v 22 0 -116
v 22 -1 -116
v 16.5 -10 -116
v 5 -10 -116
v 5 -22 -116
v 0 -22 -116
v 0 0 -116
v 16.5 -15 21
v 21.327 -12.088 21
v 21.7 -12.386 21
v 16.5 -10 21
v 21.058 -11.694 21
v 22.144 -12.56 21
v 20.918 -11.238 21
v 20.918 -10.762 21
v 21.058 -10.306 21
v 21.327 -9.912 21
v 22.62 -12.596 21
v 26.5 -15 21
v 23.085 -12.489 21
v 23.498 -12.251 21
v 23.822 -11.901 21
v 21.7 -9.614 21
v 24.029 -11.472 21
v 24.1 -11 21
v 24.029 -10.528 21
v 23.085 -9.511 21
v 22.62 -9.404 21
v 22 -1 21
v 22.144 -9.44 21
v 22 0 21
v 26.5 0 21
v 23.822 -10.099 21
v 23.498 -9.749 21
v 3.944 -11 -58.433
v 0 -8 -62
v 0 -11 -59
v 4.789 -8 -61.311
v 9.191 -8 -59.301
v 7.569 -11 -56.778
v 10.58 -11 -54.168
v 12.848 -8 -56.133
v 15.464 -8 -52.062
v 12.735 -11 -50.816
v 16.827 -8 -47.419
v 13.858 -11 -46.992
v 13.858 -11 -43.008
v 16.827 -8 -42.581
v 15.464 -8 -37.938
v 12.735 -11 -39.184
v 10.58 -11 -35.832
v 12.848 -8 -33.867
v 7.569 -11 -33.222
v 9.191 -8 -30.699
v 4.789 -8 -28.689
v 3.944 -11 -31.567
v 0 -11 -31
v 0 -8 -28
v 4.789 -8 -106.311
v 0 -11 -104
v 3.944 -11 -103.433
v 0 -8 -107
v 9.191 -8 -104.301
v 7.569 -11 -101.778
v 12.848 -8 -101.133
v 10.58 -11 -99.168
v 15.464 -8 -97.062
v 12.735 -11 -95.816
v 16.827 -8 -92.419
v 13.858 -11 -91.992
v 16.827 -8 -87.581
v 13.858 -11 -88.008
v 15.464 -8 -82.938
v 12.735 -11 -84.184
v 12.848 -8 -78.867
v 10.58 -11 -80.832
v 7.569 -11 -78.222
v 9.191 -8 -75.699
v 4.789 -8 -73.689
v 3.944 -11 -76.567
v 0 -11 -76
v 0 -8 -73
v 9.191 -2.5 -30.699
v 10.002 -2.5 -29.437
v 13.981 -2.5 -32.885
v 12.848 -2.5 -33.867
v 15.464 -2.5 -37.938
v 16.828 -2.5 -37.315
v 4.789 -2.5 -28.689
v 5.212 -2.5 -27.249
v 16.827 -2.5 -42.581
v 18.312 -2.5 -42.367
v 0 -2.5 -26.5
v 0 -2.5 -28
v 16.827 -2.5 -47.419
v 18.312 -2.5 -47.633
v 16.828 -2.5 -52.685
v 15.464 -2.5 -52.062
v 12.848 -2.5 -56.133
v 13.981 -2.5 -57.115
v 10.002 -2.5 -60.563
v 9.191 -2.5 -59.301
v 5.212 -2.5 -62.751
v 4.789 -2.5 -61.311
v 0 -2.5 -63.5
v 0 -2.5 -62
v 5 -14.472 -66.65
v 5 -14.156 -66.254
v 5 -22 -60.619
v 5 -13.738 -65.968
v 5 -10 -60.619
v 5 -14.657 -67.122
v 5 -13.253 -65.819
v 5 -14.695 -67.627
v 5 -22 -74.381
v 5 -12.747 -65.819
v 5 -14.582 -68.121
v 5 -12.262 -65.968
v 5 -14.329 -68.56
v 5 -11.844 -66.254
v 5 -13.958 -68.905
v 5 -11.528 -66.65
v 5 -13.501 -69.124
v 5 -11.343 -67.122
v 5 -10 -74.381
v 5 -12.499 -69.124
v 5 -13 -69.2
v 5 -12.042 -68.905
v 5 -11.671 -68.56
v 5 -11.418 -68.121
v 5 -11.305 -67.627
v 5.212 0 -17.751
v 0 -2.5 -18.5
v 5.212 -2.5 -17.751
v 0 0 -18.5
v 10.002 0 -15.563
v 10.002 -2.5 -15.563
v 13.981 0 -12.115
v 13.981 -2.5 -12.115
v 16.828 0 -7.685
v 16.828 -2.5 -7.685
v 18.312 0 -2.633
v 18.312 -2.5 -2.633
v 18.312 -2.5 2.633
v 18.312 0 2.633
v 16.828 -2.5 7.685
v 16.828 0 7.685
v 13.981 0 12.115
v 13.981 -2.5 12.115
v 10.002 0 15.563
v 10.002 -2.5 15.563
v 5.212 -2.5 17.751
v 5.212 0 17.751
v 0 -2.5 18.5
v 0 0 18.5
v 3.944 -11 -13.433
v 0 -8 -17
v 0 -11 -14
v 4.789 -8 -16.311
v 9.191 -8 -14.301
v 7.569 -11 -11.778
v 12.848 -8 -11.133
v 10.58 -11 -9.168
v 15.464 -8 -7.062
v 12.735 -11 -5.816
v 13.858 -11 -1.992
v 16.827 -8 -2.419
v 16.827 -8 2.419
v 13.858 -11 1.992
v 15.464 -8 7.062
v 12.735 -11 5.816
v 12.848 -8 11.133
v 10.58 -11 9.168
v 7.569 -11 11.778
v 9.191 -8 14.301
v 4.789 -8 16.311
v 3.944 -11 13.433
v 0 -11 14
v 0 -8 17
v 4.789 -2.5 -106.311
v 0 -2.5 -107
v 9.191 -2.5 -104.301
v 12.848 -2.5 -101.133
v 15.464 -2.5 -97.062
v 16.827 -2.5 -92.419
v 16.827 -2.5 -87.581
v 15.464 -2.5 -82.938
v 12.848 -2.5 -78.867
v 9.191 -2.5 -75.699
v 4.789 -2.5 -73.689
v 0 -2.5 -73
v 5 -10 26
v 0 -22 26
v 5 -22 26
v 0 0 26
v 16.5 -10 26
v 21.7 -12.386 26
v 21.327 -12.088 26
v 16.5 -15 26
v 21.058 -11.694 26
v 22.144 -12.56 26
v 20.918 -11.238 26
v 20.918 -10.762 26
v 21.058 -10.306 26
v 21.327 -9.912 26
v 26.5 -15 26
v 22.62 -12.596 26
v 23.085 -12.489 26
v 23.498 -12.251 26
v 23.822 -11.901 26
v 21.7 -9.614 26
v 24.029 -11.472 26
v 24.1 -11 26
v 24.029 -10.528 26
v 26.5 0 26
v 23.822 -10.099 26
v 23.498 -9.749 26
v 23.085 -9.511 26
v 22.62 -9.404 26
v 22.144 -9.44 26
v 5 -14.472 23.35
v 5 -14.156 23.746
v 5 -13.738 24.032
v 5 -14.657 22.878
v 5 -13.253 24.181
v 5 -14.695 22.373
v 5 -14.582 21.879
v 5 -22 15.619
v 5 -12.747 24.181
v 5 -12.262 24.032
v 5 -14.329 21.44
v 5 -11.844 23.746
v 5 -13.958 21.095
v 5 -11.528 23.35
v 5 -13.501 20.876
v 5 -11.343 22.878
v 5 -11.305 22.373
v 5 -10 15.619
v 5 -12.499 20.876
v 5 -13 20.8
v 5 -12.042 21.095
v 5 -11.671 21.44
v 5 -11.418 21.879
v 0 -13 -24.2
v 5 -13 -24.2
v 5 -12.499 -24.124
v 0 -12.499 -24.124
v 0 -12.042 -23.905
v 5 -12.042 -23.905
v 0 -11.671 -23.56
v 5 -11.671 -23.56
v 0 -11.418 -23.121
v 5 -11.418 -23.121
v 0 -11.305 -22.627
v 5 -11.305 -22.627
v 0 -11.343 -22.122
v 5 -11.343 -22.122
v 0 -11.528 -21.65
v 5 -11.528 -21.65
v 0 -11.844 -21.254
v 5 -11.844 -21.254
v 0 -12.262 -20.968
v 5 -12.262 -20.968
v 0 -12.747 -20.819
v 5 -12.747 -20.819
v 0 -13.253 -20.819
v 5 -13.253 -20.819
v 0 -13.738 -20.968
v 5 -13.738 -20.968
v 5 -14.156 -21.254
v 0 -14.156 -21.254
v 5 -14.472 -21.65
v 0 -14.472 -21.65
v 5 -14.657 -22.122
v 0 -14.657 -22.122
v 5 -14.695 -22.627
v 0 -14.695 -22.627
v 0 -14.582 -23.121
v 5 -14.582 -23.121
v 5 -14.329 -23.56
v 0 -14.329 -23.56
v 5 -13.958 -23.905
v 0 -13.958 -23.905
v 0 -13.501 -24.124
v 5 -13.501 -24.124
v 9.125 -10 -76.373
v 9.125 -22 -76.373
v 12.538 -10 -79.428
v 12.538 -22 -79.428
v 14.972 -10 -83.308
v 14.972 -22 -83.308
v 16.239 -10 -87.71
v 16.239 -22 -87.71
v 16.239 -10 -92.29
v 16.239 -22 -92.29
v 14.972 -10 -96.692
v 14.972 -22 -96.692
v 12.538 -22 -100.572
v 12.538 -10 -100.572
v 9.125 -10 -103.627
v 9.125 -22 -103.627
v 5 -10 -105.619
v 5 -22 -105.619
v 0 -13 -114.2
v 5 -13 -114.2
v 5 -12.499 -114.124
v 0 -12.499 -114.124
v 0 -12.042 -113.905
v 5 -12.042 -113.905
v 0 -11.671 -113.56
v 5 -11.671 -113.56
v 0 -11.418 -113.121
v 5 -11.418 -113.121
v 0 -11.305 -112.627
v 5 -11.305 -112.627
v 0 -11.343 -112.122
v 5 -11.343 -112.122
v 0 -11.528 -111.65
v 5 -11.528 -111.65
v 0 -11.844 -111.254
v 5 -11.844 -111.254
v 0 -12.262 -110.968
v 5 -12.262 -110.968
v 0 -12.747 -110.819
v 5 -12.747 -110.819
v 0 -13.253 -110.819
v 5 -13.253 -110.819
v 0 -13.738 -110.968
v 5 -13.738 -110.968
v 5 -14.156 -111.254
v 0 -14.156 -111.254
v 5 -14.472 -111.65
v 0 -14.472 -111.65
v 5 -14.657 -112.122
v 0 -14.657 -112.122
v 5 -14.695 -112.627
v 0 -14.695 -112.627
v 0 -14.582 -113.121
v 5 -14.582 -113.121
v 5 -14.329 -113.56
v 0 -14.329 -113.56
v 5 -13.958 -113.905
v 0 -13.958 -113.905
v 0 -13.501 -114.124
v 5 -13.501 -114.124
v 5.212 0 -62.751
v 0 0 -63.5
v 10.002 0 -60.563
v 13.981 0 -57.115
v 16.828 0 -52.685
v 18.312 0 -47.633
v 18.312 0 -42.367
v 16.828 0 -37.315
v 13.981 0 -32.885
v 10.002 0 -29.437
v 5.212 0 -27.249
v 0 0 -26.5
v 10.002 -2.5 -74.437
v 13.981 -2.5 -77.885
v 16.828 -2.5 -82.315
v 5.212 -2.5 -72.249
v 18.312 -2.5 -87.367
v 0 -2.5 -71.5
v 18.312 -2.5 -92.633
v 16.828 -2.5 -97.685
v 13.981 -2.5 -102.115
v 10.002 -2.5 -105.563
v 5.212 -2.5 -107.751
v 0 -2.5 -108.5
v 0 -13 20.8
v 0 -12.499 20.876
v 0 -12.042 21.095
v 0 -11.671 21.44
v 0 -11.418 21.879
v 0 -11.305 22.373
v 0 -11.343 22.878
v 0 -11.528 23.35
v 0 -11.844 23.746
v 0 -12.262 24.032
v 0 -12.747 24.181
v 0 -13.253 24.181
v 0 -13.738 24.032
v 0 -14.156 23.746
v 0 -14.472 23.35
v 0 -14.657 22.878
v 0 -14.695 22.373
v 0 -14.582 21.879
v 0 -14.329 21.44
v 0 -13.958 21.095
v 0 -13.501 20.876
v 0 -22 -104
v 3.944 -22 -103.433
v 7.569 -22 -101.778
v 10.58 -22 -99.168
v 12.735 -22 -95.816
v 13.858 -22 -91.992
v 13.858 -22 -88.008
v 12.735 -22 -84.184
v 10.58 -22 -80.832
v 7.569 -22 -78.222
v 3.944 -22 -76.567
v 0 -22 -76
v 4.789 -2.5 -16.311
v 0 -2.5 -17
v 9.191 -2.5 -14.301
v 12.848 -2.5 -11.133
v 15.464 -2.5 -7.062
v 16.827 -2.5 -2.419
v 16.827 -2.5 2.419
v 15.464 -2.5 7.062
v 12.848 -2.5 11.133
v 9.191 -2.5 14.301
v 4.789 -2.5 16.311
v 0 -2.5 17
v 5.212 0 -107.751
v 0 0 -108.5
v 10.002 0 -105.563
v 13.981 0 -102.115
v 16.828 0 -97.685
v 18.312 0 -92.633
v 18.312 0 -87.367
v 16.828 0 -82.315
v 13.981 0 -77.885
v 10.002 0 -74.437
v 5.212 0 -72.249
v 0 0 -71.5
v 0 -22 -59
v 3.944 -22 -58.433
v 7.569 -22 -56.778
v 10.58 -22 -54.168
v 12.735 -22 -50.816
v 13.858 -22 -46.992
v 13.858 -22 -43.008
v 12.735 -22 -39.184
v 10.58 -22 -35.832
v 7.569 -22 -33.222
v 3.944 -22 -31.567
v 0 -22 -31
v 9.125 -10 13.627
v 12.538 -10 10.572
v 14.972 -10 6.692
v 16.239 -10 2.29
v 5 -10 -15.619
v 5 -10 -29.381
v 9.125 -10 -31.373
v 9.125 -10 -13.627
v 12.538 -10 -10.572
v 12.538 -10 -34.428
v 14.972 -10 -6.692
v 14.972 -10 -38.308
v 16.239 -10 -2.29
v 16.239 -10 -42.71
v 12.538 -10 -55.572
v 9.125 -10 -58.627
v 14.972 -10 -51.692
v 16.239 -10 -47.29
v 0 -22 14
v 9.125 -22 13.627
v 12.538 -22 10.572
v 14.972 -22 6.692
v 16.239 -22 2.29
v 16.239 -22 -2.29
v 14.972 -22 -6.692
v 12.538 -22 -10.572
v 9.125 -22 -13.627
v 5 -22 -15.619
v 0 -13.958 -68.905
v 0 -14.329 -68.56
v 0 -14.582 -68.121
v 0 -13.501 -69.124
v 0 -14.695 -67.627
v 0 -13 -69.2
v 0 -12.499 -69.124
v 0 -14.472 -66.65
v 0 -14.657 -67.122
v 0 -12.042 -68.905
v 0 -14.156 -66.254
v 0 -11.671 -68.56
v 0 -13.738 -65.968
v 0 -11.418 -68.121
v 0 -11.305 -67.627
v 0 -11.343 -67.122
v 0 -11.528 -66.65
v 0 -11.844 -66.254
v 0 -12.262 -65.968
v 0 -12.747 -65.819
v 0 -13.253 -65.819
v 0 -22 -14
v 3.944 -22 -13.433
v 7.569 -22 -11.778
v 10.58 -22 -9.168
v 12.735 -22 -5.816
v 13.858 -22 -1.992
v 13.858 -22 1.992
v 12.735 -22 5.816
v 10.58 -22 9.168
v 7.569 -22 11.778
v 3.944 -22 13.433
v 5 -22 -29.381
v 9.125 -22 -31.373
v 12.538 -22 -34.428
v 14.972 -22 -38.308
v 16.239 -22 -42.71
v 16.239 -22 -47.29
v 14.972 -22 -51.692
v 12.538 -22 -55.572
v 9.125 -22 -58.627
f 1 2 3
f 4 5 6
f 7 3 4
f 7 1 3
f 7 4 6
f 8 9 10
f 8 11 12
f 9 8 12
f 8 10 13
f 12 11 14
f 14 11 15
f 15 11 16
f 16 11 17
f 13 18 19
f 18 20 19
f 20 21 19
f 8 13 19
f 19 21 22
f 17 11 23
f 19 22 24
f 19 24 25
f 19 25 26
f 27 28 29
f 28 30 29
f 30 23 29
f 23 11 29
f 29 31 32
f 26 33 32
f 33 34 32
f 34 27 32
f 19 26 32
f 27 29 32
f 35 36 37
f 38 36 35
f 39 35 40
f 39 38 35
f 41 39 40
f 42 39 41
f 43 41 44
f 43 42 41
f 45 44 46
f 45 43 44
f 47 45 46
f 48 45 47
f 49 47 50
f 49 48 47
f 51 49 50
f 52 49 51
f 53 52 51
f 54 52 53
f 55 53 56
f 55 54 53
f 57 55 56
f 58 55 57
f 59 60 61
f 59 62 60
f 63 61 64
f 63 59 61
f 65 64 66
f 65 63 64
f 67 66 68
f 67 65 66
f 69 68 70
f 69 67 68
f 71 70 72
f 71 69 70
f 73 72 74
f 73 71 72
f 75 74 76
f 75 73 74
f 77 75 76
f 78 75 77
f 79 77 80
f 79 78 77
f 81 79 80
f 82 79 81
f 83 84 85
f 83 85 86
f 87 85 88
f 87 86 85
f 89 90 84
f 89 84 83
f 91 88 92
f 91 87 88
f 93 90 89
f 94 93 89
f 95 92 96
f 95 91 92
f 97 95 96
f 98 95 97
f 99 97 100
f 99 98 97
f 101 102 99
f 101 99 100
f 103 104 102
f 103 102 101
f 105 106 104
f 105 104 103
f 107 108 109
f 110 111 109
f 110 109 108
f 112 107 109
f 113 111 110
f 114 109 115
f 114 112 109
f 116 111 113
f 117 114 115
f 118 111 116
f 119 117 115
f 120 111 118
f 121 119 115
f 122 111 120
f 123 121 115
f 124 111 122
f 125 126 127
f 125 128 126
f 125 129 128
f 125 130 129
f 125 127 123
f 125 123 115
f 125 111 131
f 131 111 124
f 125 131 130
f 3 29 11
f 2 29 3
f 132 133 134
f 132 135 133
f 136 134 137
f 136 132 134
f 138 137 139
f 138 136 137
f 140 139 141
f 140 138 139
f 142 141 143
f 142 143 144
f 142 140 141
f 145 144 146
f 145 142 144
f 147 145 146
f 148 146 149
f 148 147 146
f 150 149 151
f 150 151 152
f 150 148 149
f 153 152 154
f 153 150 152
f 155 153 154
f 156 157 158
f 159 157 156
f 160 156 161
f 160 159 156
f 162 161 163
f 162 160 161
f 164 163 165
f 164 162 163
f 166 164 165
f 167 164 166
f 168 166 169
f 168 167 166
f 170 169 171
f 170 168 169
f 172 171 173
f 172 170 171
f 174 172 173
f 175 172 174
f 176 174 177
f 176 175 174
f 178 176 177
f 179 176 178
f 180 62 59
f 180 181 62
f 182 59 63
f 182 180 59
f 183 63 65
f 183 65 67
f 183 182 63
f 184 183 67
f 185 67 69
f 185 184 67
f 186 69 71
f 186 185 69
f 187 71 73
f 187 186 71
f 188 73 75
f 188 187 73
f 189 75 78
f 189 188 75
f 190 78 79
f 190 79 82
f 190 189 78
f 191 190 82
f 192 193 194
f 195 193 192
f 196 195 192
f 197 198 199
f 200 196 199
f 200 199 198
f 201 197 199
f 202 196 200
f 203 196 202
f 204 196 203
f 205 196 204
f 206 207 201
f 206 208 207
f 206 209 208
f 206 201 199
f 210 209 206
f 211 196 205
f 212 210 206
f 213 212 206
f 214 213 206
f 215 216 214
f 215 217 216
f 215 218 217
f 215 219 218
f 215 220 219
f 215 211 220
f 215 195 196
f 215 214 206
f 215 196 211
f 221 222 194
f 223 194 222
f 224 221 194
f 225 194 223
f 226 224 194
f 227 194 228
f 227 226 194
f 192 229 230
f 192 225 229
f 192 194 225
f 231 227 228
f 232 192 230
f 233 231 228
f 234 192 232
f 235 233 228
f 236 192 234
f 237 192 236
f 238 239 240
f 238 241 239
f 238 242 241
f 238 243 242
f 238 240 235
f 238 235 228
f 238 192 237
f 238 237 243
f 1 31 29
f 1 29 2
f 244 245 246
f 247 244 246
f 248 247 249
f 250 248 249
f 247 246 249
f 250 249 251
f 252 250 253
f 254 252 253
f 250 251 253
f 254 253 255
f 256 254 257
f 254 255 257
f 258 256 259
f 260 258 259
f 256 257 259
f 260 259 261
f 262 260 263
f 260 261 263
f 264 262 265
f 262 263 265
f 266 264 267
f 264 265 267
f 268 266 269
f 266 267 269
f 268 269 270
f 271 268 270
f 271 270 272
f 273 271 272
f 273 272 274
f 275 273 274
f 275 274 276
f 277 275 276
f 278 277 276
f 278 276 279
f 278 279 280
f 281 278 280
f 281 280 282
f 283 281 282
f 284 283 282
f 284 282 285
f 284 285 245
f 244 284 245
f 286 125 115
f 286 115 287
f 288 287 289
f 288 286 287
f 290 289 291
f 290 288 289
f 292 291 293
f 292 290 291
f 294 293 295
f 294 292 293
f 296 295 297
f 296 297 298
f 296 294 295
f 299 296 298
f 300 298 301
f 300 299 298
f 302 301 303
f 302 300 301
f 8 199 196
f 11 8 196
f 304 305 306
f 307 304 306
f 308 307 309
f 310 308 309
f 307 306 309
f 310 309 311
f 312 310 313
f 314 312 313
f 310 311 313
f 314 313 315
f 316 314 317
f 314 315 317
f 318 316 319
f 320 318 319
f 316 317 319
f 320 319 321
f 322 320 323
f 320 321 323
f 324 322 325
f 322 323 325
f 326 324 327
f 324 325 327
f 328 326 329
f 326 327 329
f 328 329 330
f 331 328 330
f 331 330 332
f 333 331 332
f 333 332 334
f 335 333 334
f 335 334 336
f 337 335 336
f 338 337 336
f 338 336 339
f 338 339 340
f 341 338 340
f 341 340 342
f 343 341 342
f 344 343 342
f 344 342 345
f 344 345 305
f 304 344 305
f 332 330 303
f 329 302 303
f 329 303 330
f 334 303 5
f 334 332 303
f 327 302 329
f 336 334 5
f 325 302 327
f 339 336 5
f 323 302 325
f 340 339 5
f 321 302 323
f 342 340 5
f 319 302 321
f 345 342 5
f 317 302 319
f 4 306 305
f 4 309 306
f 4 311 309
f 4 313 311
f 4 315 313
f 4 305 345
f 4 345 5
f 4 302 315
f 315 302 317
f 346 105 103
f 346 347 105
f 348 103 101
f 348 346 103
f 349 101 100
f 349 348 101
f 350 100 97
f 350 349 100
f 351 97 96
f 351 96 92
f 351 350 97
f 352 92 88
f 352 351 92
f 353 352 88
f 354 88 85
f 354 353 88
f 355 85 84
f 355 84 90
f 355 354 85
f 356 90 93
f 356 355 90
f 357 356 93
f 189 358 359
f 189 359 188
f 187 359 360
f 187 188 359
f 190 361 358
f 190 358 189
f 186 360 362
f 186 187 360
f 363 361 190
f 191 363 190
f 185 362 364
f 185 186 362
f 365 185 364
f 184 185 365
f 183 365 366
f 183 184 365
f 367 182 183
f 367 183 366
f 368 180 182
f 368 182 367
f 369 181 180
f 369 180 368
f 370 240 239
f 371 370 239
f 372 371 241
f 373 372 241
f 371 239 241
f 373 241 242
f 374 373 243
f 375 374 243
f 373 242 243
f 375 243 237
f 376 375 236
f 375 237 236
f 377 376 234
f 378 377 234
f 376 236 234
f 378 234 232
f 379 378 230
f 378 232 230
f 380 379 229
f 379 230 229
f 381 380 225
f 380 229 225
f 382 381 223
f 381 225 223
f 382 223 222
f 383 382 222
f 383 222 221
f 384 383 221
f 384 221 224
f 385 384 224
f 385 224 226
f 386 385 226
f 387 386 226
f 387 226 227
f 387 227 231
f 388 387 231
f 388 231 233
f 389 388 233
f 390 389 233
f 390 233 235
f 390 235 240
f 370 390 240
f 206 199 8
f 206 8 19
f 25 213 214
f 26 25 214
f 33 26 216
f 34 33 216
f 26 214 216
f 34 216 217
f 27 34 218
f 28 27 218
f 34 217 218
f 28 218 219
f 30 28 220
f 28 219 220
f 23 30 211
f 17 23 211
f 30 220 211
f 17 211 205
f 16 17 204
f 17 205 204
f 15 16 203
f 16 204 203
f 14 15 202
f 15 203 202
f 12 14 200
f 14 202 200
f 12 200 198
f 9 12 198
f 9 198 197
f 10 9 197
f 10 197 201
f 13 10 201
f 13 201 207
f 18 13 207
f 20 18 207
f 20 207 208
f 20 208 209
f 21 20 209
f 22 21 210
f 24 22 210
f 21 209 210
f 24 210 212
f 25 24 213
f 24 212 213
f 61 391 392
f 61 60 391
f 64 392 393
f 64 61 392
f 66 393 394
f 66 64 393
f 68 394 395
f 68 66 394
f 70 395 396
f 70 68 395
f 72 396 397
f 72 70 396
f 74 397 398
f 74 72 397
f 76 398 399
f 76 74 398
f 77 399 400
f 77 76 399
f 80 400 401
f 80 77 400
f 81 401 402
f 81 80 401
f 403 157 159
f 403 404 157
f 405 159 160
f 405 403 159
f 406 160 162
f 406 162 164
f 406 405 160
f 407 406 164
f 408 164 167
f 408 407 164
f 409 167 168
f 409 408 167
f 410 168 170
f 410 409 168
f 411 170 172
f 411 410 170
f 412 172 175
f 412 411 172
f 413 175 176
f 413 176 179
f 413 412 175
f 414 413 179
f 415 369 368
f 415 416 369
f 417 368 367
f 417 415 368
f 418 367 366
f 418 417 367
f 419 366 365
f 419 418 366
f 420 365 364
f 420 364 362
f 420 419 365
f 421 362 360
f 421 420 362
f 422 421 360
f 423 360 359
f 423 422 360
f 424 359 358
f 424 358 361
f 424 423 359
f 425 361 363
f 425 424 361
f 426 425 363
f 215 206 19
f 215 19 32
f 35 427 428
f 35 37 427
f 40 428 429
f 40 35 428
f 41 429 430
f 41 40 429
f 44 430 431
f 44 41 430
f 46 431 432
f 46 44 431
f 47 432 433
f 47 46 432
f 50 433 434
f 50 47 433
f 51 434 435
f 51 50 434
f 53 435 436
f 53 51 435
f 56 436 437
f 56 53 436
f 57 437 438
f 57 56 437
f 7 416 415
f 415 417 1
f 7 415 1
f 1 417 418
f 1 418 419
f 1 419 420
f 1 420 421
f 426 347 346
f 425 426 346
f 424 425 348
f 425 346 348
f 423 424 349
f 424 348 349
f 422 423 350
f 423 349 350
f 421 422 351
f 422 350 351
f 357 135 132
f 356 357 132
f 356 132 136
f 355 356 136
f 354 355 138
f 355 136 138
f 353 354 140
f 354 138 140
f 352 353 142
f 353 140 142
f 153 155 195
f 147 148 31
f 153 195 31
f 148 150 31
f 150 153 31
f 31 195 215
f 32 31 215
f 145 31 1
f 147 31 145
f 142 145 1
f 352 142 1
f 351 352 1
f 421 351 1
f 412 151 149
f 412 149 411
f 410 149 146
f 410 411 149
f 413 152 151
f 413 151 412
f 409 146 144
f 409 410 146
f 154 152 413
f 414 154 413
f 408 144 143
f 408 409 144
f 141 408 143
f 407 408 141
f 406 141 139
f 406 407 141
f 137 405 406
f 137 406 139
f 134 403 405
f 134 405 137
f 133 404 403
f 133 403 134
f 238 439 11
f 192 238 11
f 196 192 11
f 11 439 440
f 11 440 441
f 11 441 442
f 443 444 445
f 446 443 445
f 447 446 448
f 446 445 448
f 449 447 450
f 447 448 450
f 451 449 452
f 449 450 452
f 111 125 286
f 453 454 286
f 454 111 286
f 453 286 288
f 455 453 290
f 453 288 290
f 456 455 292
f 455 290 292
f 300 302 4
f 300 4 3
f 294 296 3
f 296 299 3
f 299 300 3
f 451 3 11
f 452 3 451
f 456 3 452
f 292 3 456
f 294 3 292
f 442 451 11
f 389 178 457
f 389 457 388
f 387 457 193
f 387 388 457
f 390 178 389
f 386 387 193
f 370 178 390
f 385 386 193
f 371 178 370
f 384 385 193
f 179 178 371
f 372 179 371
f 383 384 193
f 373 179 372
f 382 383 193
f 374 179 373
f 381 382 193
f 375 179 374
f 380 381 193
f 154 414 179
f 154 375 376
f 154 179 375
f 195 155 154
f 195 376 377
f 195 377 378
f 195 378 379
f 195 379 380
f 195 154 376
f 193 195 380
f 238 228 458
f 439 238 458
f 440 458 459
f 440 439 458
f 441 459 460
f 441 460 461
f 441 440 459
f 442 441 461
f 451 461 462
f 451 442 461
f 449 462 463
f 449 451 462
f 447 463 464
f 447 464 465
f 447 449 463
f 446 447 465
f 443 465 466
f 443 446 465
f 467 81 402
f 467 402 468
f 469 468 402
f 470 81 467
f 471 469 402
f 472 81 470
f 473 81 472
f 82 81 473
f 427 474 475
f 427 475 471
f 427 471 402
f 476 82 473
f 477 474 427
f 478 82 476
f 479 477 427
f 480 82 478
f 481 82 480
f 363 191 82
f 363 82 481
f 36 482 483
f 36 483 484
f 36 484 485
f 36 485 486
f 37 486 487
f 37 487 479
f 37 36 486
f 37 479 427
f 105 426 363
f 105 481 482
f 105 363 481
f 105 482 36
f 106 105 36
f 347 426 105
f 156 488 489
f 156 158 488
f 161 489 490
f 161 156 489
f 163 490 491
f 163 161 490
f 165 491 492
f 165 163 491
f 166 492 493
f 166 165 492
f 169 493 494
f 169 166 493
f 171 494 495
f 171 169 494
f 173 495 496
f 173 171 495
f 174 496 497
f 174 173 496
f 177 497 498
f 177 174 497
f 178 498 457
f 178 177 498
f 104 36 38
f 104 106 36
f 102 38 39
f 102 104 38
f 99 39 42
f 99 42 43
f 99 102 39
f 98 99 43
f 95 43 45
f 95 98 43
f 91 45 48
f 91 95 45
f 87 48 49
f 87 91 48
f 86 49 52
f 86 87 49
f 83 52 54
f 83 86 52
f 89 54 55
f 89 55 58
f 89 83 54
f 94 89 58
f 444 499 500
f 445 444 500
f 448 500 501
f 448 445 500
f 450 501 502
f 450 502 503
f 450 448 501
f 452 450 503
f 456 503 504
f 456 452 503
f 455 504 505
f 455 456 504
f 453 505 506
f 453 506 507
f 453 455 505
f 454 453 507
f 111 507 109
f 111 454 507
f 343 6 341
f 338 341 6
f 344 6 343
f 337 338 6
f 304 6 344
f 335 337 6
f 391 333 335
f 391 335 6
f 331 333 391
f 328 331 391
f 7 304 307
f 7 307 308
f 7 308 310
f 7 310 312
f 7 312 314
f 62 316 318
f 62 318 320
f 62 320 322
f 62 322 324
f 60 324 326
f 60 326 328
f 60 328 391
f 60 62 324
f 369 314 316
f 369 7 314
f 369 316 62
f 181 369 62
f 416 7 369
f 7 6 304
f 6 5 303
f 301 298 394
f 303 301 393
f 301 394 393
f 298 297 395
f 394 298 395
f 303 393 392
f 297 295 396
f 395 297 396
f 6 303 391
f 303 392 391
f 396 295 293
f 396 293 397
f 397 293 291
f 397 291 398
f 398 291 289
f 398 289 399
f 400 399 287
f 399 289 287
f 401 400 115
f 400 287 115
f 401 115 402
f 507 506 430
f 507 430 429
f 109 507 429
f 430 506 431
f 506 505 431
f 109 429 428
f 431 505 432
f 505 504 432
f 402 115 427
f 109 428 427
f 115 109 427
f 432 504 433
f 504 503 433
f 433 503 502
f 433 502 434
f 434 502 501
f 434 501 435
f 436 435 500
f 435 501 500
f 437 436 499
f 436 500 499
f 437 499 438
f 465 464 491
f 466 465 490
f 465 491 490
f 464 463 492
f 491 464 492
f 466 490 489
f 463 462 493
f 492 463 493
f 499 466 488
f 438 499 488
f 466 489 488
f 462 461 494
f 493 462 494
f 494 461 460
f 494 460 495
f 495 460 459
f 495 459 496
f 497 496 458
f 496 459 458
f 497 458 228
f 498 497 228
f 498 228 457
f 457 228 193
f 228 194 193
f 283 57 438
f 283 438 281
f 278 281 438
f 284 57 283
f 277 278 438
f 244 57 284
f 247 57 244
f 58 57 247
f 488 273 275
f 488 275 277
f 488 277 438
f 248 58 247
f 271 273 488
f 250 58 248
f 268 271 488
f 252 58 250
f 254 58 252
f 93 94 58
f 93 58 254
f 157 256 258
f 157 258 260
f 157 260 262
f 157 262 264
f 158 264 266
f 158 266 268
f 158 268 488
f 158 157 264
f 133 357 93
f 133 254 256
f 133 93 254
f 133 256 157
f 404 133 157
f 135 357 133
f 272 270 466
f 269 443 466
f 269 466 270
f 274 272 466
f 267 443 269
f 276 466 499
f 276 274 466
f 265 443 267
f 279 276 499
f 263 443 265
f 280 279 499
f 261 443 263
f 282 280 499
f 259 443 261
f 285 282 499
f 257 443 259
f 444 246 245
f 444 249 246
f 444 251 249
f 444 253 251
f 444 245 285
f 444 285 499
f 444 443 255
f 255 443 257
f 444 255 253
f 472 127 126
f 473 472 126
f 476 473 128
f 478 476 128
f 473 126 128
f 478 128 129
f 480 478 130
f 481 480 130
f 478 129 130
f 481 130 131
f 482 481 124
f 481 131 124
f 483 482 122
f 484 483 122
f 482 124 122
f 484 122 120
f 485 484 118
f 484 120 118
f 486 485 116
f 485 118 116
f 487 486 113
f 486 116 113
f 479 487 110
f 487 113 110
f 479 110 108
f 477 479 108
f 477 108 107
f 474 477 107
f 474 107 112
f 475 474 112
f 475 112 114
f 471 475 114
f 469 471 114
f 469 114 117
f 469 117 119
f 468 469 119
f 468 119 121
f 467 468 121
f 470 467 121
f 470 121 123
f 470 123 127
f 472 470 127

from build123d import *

# Parameters (mm, degrees)
BOSS_EXTRUDE1_DEPTH = 10
BOSS_EXTRUDE2_DEPTH = 12
CHAMFER2_SIZE       = 5.5
CHAMFER2_SIZE2      = 9
SKETCH6_W           = 14
SKETCH6_H           = 15
SKETCH6_W_2         = 17
SKETCH6_H_2         = 2.5
SKETCH6_W_3         = 1.5
LPATTERN3_COUNT     = 3
LPATTERN3_PITCH     = 45
SKETCH7_R           = 1.7
CUT_EXTRUDE1_DEPTH  = 10
LPATTERN4_COUNT     = 3
LPATTERN4_PITCH     = 45
LPATTERN5_COUNT     = 2
LPATTERN5_PITCH     = 45
SKETCH8_W           = 10
SKETCH8_H           = 15
SKETCH8_R           = 1.6
BOSS_EXTRUDE3_DEPTH = 5


with BuildPart() as part:
    # Sketch1 → Boss-Extrude1 (new body)
    with BuildSketch(Plane(origin=(0, 0, 0), x_dir=(1, 0, 0), z_dir=(0, 1, 0))):
        with BuildLine():
            Line((0, -11.4), (0, -26))
            Line((0, -26), (22, -26))
            Line((22, -26), (22, 116))
            Line((22, 116), (0, 116))
            Line((0, 116), (0, 101.4))
            ThreePointArc((0, 101.4), (11.4, 90), (0, 78.6))
            Line((0, 78.6), (0, 56.4))
            ThreePointArc((0, 56.4), (11.4, 45), (0, 33.6))
            Line((0, 33.6), (0, 11.4))
            ThreePointArc((0, 11.4), (11.4, 0), (0, -11.4))
        make_face()
    extrude(amount=-BOSS_EXTRUDE1_DEPTH)

    # Sketch3 → Boss-Extrude2 (add)
    with BuildSketch(Plane.XZ.offset(10)):
        with BuildLine():
            Line((0, -116), (0, -101.4))
            ThreePointArc((0, -101.4), (11.4, -90), (0, -78.6))
            Line((0, -78.6), (0, -56.4))
            ThreePointArc((0, -56.4), (11.4, -45), (0, -33.6))
            Line((0, -33.6), (0, -11.4))
            ThreePointArc((0, -11.4), (11.4, 0), (0, 11.4))
            Line((0, 11.4), (0, 26))
            Line((0, 26), (5, 26))
            Line((5, 26), (5, 15.619218931))
            ThreePointArc((5, 15.619218931), (16.4, 0), (5, -15.619218931))
            Line((5, -15.619218931), (5, -29.380781069))
            ThreePointArc((5, -29.380781069), (16.4, -45), (5, -60.619218931))
            Line((5, -60.619218931), (5, -74.380781069))
            ThreePointArc((5, -74.380781069), (16.4, -90), (5, -105.619218931))
            Line((5, -105.619218931), (5, -116))
            Line((5, -116), (0, -116))
        make_face()
    extrude(amount=BOSS_EXTRUDE2_DEPTH)

    # Chamfer2
    chamfer2_edges = [part.edges().sort_by_distance(p)[0] for p in [
        (22, -10, -45),
    ]]
    chamfer2_side = [part.faces().sort_by_distance(p)[0] for p in [
        (6.430139853, -10, 20.809609465),
    ]]
    chamfer(chamfer2_edges, length=CHAMFER2_SIZE, length2=CHAMFER2_SIZE2, reference=chamfer2_side[0])

    # Sketch6 → Cut-Revolve6 (revolve, cut)
    with BuildSketch(Plane.ZY):
        with Locations((-83, -18.5)):
            Rectangle(SKETCH6_W, SKETCH6_H)
        Polygon((-90, -11), (-76, -11), (-73, -8), (-73, -2.5), (-90, -2.5), align=None)
        with Locations((-81.5, -1.25)):
            Rectangle(SKETCH6_W_2, SKETCH6_H_2)
        with Locations((-72.25, -1.25)):
            Rectangle(SKETCH6_W_3, SKETCH6_H_2)
    cut_revolve6 = revolve(axis=Axis((0, 0, -90), (0, -1, 0)), mode=Mode.SUBTRACT)

    # LPattern3: Cut-Revolve6 ×3
    with Locations(*[(0, 0, i * LPATTERN3_PITCH) for i in range(1, LPATTERN3_COUNT)]):
        add(cut_revolve6, mode=Mode.SUBTRACT)

    # Sketch7 → Cut-Extrude1 (cut)
    with BuildSketch(Plane(origin=(5, 0, 0), x_dir=(0, 0, -1), z_dir=(1, 0, 0))):
        with Locations((67.5, -13)):
            Circle(SKETCH7_R)
    cut_extrude1 = extrude(amount=-CUT_EXTRUDE1_DEPTH, mode=Mode.SUBTRACT)

    # LPattern4: Cut-Extrude1 ×3
    with Locations(*[(0, 0, i * LPATTERN4_PITCH) for i in range(1, LPATTERN4_COUNT)]):
        add(cut_extrude1, mode=Mode.SUBTRACT)

    # LPattern5: Cut-Extrude1 ×2
    with Locations(*[(0, 0, -i * LPATTERN5_PITCH) for i in range(1, LPATTERN5_COUNT)]):
        add(cut_extrude1, mode=Mode.SUBTRACT)

    # Sketch8 → Boss-Extrude3 (add)
    with BuildSketch(Plane.XY.offset(26)):
        with Locations((21.5, -7.5)):
            Rectangle(SKETCH8_W, SKETCH8_H)
        with Locations((22.5, -11)):
            Circle(SKETCH8_R, mode=Mode.SUBTRACT)
    extrude(amount=-BOSS_EXTRUDE3_DEPTH)


solid = part.part
